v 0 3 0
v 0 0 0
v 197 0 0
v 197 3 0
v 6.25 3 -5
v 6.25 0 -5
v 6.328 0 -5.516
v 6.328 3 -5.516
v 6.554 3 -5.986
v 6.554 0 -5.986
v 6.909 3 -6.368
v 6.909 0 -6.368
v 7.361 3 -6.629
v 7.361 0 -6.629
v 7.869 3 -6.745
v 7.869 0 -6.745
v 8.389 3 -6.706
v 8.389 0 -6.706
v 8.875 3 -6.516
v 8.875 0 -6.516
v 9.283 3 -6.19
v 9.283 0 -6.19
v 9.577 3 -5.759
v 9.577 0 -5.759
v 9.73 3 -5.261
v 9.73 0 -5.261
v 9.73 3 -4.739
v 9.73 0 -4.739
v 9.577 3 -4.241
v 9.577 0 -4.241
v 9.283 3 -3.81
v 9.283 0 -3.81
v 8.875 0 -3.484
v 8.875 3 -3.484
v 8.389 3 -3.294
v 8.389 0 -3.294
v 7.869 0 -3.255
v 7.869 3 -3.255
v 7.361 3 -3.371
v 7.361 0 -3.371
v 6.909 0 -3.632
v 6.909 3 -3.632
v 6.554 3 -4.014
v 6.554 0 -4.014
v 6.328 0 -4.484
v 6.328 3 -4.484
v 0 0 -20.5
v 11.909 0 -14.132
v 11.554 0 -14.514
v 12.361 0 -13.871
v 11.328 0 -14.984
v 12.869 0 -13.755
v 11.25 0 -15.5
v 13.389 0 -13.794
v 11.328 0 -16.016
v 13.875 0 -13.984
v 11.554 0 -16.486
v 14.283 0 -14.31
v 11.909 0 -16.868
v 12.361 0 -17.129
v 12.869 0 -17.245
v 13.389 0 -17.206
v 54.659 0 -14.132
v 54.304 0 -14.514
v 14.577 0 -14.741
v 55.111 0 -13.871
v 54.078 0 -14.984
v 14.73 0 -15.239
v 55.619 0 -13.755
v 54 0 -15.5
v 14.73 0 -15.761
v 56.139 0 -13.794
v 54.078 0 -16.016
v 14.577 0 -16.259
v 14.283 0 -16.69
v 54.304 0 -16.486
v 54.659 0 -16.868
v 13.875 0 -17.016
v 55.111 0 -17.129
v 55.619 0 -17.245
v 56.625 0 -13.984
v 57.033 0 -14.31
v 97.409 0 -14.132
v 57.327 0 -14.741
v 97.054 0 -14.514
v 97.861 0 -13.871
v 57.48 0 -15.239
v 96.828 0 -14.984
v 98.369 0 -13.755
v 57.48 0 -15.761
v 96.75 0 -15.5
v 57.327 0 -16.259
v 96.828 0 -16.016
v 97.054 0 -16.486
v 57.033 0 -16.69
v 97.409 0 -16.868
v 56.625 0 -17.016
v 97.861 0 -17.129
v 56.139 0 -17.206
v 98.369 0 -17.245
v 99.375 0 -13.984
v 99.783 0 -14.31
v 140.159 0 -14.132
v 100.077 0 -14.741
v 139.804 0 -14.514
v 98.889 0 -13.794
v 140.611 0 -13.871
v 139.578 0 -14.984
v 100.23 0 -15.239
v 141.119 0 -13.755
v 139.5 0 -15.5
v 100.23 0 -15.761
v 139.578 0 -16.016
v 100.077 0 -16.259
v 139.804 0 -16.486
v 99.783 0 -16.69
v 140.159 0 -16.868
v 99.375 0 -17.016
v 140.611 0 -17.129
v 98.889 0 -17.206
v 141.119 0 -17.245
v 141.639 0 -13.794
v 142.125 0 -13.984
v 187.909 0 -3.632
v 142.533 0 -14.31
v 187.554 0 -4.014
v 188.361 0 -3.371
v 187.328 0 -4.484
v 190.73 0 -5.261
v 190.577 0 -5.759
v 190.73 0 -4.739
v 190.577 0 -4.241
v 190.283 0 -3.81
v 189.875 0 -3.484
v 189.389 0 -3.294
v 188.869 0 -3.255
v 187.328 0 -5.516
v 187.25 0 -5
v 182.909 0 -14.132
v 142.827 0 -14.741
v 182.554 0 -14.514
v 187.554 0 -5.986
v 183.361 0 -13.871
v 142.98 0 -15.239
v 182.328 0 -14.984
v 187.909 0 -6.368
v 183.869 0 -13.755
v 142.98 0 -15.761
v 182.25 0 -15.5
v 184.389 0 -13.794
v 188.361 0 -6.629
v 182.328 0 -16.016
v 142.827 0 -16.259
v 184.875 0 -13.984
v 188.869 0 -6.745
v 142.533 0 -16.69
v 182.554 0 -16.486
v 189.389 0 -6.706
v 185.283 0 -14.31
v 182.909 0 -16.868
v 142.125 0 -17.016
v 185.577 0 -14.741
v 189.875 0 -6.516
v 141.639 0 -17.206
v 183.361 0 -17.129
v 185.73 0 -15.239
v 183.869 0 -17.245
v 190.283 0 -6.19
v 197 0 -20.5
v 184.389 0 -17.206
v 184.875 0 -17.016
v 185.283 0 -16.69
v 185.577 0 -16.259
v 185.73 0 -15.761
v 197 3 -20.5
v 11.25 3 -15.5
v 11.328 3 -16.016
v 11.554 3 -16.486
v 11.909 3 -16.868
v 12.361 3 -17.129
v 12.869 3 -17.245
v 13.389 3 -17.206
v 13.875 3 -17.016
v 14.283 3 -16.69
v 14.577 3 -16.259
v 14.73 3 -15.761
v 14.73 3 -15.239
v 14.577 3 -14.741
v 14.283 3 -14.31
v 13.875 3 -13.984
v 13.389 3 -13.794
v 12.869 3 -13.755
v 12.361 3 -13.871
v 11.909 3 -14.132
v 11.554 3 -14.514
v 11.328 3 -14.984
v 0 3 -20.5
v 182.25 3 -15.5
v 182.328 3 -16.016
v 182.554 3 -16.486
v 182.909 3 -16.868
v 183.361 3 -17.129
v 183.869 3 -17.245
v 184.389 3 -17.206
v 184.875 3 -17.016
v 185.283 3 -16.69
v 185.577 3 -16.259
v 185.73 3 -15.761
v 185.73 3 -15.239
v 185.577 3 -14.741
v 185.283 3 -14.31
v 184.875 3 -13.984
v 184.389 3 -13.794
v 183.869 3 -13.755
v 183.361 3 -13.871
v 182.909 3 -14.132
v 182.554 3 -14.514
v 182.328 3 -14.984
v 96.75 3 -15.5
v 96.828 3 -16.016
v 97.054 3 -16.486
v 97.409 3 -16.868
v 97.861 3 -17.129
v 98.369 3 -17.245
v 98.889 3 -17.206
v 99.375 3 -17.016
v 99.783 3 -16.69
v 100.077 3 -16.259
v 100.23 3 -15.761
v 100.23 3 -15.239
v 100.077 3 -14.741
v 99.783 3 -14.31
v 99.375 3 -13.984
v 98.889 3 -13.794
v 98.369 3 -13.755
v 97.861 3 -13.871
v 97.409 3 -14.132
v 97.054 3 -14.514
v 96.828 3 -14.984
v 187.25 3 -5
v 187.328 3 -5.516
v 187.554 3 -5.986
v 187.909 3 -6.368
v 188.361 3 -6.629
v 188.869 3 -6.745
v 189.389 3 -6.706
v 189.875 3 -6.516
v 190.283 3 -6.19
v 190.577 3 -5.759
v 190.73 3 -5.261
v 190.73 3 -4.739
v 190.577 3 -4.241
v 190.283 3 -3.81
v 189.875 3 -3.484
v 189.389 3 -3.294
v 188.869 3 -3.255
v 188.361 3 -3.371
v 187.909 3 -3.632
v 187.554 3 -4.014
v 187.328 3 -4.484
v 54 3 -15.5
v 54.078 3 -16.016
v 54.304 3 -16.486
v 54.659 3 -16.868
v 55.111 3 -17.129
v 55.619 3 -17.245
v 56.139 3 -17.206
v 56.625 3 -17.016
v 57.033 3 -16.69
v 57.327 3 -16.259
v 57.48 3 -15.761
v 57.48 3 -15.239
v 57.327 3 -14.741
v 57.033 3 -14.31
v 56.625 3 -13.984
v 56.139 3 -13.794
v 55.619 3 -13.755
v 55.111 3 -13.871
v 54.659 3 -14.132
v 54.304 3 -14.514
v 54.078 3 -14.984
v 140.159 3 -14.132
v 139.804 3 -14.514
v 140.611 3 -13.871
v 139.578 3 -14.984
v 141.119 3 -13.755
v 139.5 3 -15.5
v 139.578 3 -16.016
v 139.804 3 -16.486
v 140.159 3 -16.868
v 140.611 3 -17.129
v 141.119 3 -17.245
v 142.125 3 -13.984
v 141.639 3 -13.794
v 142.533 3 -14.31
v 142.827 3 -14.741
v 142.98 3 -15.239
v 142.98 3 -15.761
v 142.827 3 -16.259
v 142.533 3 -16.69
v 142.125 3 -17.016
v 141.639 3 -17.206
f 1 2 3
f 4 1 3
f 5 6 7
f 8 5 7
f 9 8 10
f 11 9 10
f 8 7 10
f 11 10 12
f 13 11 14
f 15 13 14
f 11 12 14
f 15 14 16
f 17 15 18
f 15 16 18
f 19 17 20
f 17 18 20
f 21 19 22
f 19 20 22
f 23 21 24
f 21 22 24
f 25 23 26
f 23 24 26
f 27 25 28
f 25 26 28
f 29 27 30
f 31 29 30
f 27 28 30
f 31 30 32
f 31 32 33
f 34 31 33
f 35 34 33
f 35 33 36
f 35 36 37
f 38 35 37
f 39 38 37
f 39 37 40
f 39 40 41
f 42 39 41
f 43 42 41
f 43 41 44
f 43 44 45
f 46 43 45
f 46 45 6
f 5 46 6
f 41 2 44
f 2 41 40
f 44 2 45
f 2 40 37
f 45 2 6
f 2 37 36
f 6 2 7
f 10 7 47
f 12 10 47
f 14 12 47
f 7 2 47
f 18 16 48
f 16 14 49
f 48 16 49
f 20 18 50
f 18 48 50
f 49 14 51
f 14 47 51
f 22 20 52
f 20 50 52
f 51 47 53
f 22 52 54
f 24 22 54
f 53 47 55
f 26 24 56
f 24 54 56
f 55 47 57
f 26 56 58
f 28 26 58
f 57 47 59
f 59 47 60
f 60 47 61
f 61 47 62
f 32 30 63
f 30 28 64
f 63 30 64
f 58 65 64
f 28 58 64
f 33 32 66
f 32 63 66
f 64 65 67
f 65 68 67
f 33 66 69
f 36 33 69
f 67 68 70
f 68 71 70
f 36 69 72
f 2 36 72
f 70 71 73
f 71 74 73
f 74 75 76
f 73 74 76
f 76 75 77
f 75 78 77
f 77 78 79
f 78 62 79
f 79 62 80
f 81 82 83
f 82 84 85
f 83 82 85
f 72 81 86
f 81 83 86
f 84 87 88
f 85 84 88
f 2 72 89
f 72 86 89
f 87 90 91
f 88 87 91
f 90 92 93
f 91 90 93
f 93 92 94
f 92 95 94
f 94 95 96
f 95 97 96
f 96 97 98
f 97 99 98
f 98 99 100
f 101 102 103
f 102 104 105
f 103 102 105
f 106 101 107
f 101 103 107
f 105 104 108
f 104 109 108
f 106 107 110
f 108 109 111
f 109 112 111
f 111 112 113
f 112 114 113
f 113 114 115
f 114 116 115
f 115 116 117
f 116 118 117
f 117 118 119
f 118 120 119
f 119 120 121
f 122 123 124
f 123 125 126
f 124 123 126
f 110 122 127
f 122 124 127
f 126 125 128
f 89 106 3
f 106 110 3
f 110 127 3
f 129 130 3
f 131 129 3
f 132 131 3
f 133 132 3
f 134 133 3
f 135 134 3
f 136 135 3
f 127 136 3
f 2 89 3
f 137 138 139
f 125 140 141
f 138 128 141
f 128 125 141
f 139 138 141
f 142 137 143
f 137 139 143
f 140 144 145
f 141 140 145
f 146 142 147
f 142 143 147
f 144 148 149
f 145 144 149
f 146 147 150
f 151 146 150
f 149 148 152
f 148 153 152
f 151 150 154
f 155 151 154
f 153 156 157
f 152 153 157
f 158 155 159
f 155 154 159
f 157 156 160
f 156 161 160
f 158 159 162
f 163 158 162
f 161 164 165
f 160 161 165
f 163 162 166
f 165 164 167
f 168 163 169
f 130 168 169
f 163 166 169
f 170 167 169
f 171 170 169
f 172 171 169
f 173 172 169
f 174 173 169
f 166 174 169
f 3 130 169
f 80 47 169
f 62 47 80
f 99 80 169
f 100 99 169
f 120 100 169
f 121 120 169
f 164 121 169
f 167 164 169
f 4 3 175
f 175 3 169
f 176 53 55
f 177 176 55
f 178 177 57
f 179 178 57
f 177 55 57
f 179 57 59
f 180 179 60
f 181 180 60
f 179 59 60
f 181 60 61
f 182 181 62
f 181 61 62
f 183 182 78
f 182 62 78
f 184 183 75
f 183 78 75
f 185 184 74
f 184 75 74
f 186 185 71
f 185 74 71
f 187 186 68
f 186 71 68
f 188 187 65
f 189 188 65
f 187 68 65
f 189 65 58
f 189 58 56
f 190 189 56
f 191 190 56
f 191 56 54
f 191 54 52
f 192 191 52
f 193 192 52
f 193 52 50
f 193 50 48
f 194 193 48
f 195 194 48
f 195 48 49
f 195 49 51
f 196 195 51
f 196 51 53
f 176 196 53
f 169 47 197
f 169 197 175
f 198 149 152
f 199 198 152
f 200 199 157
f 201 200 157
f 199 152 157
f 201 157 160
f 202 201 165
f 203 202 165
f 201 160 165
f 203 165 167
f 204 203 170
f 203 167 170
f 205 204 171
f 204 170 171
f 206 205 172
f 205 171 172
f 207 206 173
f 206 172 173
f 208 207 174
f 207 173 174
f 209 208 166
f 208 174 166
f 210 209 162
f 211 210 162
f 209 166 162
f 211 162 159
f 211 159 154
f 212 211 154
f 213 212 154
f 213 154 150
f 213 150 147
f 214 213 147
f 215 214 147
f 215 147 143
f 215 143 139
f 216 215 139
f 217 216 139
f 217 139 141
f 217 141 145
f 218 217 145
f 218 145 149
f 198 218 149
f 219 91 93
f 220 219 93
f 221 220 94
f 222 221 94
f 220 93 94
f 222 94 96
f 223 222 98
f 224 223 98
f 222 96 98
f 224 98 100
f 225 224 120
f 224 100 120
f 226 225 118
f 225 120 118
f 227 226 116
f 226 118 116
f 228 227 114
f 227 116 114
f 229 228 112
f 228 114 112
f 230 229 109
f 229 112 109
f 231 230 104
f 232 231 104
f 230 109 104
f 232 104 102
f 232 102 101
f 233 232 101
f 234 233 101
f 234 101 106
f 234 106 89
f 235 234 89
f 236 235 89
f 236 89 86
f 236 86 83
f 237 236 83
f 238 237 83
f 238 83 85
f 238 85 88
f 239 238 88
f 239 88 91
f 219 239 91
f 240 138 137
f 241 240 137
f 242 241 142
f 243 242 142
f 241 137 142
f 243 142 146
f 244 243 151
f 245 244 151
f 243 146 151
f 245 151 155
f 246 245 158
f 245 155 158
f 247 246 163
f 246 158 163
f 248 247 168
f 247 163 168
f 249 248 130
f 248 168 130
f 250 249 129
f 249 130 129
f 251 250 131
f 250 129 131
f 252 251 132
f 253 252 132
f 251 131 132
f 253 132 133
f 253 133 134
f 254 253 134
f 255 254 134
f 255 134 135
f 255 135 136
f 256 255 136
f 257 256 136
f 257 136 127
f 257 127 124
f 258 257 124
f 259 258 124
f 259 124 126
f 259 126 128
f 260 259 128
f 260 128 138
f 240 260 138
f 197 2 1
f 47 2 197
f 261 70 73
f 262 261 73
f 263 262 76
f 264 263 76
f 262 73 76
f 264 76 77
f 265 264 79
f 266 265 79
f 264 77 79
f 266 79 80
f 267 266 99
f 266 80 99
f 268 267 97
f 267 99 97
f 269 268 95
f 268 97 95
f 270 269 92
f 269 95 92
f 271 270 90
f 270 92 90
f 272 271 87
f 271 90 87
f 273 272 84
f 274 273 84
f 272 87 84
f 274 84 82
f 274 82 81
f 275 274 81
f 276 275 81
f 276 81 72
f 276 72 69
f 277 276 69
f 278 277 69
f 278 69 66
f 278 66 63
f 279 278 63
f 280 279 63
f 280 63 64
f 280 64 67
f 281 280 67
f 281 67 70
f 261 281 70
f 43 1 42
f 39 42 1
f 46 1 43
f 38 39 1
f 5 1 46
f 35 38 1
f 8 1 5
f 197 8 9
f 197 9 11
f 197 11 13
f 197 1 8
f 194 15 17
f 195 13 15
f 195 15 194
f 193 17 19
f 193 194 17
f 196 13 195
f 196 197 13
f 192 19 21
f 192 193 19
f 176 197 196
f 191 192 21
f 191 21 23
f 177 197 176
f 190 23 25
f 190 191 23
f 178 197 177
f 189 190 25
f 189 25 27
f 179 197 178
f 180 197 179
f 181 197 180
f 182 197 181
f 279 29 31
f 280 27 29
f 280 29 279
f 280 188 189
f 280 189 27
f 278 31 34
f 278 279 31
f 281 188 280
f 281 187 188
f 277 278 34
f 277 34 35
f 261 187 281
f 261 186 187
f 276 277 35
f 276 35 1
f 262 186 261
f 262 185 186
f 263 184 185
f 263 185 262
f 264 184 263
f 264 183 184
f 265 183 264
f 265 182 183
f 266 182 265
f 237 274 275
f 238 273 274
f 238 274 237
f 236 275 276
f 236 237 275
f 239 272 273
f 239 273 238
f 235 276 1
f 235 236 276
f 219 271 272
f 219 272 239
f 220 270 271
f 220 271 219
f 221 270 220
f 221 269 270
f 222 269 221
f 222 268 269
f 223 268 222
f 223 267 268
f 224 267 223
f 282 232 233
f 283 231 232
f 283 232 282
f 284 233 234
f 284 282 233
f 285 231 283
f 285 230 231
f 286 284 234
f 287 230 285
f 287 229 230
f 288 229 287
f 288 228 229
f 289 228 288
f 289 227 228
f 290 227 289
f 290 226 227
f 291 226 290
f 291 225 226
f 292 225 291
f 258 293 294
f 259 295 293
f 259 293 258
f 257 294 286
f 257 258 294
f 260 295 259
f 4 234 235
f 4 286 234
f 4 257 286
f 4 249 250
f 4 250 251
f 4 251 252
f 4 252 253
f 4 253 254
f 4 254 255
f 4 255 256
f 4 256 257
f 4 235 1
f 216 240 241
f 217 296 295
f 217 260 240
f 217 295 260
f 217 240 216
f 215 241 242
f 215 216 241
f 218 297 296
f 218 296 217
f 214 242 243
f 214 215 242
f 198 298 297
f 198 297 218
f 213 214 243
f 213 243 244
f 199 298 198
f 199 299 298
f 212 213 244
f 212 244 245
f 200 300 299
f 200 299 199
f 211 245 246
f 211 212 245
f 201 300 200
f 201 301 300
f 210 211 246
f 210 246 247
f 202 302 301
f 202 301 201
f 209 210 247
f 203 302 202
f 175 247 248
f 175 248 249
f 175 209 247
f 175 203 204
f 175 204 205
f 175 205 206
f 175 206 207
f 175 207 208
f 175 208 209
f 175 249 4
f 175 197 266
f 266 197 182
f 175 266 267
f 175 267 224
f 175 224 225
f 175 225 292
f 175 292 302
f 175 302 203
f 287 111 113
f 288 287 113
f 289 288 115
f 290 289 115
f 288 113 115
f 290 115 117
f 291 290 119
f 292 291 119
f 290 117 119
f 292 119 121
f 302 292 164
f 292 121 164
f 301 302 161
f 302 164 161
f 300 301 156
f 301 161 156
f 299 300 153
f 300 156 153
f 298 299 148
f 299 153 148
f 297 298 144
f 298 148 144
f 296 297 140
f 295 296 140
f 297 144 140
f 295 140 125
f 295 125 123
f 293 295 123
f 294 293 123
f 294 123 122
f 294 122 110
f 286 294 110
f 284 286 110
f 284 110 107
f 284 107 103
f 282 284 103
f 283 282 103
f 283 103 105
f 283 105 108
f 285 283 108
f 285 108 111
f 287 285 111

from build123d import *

# Parameters (mm, degrees)
SKETCH_1_W      = 197
SKETCH_1_H      = 20.5
EXTRUDE_1_DEPTH = 3
HOLE_WIZARD_1_D = 3.5
HOLE_WIZARD_2_D = 3.5


with BuildPart() as part:
    # 草图1 → 凸台-拉伸1 (new body)
    with BuildSketch(Plane(origin=(0, 0, 0), x_dir=(1, 0, 0), z_dir=(0, 1, 0))):
        with Locations((98.5, 10.25)):
            Rectangle(SKETCH_1_W, SKETCH_1_H)
    extrude(amount=EXTRUDE_1_DEPTH)

    # 孔1 (through all)
    with Locations(Plane(origin=(0, 3, 0), x_dir=(1, 0, 0), z_dir=(0, 1, 0))):
        with Locations((8, 5), (189, 5)):
            Hole(HOLE_WIZARD_1_D / 2)

    # 孔2 (through all)
    with Locations(Plane(origin=(0, 3, 0), x_dir=(1, 0, 0), z_dir=(0, 1, 0))):
        with Locations((98.5, 15.5), (141.25, 15.5), (55.75, 15.5), (13, 15.5), (184, 15.5)):
            Hole(HOLE_WIZARD_2_D / 2)


solid = part.part
